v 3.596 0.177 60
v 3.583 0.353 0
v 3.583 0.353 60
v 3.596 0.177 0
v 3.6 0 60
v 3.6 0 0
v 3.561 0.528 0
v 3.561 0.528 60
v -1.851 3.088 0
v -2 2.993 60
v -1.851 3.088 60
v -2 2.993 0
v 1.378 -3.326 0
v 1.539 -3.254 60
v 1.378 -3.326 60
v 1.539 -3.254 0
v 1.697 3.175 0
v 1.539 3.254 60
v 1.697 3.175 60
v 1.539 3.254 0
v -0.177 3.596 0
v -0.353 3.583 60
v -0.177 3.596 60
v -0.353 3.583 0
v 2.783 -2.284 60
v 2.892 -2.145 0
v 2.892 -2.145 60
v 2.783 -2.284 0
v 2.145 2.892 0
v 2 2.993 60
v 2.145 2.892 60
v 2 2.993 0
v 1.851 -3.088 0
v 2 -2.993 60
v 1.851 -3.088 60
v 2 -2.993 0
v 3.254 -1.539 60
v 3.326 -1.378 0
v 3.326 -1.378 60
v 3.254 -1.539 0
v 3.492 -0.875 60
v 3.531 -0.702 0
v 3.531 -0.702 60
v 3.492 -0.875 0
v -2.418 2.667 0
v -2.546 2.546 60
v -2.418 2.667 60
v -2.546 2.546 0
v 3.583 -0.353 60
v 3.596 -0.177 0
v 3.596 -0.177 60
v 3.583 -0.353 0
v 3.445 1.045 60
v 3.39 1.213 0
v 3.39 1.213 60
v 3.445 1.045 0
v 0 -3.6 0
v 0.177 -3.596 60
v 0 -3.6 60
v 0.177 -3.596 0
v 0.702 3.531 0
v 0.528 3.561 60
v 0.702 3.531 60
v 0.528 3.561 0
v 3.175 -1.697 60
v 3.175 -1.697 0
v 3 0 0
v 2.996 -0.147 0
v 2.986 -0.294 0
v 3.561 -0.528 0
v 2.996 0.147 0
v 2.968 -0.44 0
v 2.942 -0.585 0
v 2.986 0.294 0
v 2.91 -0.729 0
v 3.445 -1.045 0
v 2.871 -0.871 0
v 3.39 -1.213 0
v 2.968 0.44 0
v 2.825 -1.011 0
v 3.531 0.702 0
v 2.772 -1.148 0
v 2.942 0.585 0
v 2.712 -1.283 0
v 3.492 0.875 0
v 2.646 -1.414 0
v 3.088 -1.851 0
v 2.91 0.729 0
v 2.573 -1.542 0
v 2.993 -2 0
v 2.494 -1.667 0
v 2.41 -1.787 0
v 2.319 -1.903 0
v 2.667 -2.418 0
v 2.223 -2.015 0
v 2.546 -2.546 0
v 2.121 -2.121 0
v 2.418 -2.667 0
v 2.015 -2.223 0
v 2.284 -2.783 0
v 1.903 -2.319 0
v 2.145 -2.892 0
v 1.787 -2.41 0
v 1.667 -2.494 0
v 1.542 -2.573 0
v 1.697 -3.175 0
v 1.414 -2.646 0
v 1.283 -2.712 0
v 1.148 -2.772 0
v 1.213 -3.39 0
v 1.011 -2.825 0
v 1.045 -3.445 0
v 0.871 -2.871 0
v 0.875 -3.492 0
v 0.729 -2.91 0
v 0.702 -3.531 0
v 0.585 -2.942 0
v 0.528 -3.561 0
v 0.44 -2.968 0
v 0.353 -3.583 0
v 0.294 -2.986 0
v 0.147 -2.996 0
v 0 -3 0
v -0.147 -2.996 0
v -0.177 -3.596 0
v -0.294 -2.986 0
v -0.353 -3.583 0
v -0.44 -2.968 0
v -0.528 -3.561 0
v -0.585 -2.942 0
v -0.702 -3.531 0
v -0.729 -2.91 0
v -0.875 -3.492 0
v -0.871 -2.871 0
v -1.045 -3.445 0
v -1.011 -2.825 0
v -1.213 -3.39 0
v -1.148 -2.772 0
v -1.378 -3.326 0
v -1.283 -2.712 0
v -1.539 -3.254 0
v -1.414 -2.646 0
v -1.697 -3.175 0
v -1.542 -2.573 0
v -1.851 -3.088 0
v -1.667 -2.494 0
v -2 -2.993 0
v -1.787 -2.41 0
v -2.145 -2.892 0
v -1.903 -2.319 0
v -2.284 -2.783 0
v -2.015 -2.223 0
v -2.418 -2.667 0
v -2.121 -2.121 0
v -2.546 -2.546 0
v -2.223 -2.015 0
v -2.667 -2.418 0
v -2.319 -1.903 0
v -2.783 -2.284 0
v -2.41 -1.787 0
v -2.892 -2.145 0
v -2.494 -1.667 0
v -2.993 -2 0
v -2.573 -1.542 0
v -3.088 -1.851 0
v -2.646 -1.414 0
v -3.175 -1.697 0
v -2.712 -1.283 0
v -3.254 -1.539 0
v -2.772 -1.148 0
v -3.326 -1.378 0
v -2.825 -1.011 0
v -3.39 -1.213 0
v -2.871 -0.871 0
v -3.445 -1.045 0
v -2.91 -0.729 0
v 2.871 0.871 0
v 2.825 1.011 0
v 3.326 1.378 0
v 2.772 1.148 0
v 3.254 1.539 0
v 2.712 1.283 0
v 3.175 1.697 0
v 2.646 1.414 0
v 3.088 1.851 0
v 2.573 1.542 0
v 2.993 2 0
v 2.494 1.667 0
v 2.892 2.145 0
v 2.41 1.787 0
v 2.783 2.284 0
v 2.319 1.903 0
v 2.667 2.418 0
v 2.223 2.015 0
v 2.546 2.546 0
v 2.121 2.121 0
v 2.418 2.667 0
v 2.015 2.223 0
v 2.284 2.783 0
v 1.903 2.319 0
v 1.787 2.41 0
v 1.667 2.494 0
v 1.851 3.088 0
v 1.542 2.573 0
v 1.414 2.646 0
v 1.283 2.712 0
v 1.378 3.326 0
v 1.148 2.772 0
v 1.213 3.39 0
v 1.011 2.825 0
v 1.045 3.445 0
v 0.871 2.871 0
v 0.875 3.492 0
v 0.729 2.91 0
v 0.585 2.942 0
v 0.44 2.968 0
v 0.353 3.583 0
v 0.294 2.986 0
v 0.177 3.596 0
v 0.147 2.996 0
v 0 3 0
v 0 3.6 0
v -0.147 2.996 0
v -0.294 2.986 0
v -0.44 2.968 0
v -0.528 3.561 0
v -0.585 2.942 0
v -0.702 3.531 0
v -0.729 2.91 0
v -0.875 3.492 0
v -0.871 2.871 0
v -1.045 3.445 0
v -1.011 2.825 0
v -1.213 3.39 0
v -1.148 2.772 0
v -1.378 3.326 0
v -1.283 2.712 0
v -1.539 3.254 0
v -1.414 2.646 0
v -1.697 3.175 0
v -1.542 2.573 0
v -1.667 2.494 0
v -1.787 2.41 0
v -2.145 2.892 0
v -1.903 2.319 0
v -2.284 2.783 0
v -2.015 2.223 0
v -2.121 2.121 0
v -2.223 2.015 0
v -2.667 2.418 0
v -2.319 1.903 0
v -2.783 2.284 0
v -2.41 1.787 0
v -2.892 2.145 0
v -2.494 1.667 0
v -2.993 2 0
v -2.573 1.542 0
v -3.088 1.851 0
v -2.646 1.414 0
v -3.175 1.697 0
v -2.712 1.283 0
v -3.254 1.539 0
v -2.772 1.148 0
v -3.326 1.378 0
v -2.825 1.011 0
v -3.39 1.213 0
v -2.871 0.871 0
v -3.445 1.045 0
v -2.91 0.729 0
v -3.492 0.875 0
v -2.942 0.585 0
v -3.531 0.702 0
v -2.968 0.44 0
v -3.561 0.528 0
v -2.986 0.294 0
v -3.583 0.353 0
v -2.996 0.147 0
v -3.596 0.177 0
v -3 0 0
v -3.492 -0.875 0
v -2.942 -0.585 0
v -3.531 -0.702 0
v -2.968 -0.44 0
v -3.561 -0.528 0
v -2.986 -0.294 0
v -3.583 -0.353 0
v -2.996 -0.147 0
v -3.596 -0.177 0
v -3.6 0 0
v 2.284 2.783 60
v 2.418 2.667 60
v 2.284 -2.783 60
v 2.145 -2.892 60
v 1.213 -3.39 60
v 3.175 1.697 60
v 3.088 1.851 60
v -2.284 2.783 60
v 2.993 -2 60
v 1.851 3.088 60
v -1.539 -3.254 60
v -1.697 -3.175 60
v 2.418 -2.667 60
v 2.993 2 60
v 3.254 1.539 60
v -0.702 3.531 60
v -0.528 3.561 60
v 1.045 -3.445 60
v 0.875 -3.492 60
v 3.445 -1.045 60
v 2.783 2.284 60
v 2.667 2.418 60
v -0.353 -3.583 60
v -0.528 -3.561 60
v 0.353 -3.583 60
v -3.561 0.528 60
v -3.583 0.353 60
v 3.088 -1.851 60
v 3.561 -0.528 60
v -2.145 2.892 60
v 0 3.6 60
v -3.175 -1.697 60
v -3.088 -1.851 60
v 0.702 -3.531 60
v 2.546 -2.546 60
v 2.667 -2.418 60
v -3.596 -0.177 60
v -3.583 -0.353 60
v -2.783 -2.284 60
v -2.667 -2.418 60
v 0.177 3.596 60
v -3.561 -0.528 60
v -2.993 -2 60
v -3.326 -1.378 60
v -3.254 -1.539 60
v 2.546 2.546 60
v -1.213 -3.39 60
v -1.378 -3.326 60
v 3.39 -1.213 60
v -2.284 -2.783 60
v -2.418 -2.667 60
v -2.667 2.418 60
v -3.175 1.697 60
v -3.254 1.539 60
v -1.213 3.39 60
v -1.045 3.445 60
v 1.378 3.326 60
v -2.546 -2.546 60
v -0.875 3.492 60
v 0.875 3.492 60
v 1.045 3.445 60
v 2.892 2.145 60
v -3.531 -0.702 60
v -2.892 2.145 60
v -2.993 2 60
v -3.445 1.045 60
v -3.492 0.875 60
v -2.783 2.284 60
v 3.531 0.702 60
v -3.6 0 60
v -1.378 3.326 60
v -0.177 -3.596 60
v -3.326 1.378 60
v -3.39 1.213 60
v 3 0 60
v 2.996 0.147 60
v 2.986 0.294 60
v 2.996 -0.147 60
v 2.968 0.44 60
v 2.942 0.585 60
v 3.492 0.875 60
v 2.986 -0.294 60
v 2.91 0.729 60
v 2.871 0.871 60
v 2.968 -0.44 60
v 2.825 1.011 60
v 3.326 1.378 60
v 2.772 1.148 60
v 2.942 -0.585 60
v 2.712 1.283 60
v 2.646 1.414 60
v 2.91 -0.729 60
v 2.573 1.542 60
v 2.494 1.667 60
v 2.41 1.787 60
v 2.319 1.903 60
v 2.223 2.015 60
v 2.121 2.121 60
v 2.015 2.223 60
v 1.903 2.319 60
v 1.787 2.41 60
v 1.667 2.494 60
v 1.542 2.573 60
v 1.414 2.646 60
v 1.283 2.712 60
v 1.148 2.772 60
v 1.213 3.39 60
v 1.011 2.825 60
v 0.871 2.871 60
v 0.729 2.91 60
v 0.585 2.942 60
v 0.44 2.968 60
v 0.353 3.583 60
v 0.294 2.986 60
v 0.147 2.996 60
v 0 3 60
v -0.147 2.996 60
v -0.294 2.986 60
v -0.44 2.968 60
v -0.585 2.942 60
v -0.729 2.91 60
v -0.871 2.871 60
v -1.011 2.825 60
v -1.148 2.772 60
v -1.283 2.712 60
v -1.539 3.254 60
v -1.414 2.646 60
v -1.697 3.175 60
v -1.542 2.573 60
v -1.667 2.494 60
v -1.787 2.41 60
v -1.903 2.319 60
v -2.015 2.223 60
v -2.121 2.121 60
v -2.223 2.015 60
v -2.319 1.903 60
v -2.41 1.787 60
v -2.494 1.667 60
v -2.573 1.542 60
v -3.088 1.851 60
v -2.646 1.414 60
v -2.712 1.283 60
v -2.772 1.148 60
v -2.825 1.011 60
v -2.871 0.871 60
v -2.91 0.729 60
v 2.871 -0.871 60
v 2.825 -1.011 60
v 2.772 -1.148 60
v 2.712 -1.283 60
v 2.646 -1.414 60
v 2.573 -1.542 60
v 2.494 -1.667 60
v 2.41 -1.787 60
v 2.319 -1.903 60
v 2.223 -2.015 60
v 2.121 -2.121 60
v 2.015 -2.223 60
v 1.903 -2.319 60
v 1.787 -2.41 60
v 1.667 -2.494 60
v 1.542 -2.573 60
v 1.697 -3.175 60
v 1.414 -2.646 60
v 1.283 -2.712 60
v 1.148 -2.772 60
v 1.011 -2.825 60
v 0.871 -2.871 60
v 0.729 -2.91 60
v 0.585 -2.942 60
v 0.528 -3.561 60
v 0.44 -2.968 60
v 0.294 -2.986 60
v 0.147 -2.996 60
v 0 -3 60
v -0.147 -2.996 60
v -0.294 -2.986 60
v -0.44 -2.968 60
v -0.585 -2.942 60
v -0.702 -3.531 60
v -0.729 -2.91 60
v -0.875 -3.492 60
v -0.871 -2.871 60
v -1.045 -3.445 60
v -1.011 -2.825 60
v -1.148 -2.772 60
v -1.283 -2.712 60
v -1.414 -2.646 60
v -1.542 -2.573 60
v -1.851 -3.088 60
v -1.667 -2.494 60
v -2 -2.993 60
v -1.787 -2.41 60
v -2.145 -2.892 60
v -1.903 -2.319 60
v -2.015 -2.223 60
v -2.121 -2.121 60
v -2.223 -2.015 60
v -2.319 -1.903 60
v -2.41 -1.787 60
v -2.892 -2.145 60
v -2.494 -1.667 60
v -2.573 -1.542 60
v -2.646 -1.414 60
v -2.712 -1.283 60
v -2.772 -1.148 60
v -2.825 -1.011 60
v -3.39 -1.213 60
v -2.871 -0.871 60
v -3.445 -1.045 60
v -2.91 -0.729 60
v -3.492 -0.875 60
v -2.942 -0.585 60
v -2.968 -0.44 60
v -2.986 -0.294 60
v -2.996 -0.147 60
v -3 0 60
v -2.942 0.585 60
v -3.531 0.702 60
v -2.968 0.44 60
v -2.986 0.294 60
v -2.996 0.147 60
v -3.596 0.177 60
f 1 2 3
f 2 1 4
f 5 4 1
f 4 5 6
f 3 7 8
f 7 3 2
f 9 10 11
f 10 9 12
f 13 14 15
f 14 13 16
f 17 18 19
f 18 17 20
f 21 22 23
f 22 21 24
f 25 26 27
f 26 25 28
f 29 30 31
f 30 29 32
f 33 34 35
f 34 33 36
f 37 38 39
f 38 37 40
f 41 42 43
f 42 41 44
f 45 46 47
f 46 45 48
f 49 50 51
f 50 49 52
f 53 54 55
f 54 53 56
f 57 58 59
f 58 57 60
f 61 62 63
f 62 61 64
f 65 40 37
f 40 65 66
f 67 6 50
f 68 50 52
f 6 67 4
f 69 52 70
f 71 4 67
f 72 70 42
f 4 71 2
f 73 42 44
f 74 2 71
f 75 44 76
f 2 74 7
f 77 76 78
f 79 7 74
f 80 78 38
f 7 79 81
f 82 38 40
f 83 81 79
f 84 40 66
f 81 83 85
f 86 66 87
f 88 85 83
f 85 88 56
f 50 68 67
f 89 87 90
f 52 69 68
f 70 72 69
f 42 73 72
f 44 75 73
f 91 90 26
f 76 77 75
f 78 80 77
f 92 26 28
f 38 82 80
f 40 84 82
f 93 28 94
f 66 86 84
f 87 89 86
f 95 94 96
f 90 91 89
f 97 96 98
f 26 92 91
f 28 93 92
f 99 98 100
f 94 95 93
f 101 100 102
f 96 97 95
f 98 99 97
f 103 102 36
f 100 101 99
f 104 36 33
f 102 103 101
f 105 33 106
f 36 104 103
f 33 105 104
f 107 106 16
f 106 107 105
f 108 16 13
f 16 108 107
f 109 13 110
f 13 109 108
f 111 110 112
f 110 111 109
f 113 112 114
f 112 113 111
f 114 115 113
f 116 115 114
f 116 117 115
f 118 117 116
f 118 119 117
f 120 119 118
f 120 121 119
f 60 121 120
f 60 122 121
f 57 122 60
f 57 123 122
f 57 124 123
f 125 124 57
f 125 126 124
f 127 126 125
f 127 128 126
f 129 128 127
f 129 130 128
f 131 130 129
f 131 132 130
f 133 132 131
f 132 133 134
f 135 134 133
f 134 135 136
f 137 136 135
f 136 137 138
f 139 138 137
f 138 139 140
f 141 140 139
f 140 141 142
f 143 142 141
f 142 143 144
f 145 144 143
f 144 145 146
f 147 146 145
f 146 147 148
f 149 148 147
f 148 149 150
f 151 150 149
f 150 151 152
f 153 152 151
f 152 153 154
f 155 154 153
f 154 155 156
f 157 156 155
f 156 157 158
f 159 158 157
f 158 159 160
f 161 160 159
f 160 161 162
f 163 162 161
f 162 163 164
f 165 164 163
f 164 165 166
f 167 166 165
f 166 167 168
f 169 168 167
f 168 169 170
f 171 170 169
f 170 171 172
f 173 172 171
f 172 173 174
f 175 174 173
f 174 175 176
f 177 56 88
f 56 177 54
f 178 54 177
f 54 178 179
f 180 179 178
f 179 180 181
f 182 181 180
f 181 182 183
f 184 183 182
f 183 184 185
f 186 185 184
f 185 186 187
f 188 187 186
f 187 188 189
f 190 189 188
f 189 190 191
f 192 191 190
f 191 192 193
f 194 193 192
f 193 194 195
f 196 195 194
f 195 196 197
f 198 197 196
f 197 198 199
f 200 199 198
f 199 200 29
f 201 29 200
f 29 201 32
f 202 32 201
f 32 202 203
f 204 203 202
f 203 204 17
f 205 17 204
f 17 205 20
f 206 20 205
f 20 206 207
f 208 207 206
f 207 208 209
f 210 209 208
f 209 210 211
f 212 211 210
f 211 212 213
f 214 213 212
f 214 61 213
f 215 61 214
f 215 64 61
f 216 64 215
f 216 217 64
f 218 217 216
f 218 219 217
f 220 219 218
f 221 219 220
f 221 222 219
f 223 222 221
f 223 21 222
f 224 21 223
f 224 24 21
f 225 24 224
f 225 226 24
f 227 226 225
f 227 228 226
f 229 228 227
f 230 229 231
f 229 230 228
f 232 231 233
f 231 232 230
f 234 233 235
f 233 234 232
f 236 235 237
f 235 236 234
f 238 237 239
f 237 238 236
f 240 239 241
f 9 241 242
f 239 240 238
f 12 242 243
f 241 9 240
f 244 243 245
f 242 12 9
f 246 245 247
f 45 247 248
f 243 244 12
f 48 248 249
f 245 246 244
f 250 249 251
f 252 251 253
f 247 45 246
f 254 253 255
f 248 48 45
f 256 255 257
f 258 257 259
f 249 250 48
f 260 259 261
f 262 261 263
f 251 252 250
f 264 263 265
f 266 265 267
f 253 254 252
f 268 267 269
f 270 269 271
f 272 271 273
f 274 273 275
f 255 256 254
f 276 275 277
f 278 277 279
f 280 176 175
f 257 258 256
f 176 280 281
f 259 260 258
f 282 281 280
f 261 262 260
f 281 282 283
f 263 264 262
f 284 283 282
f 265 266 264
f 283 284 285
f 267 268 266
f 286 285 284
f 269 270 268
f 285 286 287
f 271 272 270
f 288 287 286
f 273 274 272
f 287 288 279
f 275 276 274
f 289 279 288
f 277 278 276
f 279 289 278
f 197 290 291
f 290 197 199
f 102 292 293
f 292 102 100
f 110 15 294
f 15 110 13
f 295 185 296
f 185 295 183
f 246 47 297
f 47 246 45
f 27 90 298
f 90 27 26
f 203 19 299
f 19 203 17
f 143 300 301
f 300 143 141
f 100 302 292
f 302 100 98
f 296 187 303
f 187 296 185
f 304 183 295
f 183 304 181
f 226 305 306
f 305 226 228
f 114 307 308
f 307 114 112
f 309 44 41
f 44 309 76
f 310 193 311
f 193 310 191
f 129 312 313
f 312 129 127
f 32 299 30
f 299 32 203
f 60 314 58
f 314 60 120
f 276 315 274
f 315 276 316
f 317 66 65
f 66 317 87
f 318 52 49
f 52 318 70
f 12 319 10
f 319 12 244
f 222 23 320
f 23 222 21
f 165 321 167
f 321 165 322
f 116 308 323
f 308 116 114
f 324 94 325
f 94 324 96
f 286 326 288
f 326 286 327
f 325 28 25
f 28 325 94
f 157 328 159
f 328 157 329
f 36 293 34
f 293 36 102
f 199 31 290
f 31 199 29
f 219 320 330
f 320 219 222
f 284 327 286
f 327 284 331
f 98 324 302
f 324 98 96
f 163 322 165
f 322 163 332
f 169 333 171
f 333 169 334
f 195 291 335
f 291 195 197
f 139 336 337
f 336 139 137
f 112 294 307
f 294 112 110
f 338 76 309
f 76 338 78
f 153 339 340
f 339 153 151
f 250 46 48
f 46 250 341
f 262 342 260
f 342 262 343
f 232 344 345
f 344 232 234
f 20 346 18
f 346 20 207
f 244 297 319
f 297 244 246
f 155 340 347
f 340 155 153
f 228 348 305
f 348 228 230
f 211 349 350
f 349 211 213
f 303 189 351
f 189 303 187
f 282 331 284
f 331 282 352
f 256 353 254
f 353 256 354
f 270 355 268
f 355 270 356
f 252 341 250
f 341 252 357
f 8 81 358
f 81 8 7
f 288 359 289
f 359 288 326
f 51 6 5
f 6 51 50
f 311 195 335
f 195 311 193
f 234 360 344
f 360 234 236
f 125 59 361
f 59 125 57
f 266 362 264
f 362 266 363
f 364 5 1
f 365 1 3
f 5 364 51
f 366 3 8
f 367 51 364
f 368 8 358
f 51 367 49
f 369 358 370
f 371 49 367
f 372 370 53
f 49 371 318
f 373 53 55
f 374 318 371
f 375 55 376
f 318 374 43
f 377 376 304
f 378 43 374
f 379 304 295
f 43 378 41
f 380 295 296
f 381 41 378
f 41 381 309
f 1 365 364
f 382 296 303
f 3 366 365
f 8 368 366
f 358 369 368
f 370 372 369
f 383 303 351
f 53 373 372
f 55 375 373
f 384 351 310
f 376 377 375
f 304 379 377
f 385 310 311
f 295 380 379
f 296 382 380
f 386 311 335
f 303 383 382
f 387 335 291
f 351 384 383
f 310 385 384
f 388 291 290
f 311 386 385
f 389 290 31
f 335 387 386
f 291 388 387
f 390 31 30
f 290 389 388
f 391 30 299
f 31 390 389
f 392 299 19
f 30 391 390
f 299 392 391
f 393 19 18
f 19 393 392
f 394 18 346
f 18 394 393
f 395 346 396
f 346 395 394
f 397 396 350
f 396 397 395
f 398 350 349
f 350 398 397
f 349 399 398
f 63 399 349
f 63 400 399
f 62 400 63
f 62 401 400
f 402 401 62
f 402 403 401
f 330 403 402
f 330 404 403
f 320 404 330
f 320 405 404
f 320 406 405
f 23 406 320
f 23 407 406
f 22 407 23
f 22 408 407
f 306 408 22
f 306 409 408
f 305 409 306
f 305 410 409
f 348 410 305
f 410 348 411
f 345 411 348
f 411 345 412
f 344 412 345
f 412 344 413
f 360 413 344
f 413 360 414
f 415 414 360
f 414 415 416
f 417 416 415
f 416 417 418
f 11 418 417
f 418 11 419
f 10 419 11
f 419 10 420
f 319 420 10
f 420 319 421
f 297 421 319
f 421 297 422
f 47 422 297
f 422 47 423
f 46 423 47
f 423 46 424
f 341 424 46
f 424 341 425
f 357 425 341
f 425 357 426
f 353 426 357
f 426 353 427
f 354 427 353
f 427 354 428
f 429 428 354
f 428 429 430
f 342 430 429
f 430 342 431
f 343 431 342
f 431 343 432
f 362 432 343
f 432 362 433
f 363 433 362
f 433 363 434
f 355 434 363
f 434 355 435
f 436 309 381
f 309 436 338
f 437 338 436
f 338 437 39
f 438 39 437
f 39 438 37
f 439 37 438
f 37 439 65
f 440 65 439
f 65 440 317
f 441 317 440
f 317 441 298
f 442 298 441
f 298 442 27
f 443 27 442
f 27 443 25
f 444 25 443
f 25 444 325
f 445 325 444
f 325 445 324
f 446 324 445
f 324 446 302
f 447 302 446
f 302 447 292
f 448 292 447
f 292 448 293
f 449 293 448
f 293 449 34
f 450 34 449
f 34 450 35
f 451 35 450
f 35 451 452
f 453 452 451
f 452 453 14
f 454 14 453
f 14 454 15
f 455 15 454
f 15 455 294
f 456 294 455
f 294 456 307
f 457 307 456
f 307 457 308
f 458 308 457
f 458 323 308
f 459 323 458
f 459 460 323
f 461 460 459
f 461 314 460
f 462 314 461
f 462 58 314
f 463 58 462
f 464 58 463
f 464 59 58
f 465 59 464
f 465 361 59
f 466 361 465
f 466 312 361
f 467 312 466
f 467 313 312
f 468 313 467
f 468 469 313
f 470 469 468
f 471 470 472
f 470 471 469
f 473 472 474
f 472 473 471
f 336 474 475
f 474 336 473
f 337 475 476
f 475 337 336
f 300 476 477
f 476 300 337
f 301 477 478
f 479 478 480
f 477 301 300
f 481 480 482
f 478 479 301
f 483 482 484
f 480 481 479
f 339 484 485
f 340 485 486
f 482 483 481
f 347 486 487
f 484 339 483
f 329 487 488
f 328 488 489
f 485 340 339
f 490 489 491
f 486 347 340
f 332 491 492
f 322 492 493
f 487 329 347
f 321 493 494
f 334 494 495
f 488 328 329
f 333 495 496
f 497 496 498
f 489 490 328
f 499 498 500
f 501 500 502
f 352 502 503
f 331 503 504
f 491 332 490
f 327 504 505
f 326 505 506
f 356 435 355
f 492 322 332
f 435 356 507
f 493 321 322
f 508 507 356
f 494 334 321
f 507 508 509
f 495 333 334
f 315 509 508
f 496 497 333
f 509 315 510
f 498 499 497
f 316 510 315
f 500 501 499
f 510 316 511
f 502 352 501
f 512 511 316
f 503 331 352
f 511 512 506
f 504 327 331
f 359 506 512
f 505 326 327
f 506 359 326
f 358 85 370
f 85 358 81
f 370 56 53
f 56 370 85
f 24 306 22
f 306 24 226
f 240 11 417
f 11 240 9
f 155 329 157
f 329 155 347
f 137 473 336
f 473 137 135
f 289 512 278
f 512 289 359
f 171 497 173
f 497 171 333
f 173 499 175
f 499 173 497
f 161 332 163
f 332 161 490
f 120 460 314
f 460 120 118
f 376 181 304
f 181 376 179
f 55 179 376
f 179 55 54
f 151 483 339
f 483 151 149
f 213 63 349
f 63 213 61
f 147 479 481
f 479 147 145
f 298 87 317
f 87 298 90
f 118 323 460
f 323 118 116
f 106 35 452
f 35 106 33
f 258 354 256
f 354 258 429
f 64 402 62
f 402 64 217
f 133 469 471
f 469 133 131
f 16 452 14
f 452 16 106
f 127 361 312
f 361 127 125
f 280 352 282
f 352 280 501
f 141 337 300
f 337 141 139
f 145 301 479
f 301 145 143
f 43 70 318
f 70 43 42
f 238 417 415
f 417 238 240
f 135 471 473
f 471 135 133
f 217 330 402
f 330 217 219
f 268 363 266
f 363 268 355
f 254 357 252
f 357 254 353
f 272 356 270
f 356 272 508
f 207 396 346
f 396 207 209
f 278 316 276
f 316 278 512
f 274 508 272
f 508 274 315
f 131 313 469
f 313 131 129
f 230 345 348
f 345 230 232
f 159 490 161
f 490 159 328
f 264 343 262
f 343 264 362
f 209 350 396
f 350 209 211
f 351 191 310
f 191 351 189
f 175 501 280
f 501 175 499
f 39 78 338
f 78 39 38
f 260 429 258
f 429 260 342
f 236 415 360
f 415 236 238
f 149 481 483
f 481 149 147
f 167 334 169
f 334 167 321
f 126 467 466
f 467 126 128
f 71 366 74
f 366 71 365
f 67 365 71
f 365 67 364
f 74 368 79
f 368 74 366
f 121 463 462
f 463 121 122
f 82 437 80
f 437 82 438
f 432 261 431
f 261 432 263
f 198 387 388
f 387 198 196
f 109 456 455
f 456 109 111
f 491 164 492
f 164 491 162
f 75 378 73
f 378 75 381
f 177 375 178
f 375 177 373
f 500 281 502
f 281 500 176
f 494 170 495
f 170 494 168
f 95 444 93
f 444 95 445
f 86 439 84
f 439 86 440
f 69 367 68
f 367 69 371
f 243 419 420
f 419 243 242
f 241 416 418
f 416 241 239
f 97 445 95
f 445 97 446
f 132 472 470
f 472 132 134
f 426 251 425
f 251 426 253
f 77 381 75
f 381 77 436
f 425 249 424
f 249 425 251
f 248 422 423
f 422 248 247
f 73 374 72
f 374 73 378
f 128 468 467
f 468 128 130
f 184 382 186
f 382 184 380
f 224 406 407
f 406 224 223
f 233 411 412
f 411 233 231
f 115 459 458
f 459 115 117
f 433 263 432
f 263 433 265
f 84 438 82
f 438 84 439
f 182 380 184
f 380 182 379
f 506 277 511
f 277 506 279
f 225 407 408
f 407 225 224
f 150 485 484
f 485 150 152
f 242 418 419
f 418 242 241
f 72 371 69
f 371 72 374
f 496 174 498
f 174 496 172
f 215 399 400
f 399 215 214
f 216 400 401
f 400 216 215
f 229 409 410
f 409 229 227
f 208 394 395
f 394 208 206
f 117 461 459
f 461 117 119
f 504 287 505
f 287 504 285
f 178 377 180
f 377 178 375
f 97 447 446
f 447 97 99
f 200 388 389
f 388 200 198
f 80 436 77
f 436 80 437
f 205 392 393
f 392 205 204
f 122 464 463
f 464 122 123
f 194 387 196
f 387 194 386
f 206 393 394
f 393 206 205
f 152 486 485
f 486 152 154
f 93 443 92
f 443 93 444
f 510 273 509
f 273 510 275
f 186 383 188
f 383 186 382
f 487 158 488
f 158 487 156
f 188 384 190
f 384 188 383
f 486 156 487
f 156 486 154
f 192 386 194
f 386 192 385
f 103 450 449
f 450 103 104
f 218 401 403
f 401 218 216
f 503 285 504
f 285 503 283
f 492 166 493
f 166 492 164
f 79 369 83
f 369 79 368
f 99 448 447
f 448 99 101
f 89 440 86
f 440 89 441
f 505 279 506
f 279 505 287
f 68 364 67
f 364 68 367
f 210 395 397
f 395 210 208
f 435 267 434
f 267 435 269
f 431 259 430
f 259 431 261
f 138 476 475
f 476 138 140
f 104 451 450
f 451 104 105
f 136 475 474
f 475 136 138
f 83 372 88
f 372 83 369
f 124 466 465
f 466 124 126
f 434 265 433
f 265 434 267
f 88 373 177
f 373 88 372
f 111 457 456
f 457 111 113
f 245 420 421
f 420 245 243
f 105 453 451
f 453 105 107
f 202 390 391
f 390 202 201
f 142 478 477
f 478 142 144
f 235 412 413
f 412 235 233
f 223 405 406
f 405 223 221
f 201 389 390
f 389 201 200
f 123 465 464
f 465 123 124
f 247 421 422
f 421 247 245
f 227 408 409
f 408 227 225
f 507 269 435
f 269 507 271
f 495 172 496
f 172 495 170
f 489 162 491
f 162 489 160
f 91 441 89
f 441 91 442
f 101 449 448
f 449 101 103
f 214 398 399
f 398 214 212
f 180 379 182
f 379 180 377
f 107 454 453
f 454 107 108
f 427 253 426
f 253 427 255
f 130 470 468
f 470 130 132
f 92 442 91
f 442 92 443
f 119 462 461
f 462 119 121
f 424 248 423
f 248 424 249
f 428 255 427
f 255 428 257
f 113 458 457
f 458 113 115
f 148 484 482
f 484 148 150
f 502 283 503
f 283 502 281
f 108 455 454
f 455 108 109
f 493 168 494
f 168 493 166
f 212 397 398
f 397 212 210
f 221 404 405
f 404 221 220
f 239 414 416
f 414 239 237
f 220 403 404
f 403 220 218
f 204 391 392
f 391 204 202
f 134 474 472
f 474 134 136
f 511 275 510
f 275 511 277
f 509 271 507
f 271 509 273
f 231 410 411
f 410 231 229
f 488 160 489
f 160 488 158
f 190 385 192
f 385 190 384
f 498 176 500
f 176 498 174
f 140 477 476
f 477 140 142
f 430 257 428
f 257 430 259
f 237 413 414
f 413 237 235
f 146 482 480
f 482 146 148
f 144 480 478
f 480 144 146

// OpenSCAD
$fn = 128;

// Heatshrink sleeving (tubing)
inner_d = 6;          // mm
wall = 0.6;           // mm
length = 60;          // mm

outer_d = inner_d + 2*wall;

module heatshrink_sleeve(id=6, wall=0.6, h=60) {
    od = id + 2*wall;
    difference() {
        cylinder(d=od, h=h, center=false);
        translate([0,0,-0.5])
            cylinder(d=id, h=h+1, center=false);
    }
}

heatshrink_sleeve(inner_d, wall, length);
